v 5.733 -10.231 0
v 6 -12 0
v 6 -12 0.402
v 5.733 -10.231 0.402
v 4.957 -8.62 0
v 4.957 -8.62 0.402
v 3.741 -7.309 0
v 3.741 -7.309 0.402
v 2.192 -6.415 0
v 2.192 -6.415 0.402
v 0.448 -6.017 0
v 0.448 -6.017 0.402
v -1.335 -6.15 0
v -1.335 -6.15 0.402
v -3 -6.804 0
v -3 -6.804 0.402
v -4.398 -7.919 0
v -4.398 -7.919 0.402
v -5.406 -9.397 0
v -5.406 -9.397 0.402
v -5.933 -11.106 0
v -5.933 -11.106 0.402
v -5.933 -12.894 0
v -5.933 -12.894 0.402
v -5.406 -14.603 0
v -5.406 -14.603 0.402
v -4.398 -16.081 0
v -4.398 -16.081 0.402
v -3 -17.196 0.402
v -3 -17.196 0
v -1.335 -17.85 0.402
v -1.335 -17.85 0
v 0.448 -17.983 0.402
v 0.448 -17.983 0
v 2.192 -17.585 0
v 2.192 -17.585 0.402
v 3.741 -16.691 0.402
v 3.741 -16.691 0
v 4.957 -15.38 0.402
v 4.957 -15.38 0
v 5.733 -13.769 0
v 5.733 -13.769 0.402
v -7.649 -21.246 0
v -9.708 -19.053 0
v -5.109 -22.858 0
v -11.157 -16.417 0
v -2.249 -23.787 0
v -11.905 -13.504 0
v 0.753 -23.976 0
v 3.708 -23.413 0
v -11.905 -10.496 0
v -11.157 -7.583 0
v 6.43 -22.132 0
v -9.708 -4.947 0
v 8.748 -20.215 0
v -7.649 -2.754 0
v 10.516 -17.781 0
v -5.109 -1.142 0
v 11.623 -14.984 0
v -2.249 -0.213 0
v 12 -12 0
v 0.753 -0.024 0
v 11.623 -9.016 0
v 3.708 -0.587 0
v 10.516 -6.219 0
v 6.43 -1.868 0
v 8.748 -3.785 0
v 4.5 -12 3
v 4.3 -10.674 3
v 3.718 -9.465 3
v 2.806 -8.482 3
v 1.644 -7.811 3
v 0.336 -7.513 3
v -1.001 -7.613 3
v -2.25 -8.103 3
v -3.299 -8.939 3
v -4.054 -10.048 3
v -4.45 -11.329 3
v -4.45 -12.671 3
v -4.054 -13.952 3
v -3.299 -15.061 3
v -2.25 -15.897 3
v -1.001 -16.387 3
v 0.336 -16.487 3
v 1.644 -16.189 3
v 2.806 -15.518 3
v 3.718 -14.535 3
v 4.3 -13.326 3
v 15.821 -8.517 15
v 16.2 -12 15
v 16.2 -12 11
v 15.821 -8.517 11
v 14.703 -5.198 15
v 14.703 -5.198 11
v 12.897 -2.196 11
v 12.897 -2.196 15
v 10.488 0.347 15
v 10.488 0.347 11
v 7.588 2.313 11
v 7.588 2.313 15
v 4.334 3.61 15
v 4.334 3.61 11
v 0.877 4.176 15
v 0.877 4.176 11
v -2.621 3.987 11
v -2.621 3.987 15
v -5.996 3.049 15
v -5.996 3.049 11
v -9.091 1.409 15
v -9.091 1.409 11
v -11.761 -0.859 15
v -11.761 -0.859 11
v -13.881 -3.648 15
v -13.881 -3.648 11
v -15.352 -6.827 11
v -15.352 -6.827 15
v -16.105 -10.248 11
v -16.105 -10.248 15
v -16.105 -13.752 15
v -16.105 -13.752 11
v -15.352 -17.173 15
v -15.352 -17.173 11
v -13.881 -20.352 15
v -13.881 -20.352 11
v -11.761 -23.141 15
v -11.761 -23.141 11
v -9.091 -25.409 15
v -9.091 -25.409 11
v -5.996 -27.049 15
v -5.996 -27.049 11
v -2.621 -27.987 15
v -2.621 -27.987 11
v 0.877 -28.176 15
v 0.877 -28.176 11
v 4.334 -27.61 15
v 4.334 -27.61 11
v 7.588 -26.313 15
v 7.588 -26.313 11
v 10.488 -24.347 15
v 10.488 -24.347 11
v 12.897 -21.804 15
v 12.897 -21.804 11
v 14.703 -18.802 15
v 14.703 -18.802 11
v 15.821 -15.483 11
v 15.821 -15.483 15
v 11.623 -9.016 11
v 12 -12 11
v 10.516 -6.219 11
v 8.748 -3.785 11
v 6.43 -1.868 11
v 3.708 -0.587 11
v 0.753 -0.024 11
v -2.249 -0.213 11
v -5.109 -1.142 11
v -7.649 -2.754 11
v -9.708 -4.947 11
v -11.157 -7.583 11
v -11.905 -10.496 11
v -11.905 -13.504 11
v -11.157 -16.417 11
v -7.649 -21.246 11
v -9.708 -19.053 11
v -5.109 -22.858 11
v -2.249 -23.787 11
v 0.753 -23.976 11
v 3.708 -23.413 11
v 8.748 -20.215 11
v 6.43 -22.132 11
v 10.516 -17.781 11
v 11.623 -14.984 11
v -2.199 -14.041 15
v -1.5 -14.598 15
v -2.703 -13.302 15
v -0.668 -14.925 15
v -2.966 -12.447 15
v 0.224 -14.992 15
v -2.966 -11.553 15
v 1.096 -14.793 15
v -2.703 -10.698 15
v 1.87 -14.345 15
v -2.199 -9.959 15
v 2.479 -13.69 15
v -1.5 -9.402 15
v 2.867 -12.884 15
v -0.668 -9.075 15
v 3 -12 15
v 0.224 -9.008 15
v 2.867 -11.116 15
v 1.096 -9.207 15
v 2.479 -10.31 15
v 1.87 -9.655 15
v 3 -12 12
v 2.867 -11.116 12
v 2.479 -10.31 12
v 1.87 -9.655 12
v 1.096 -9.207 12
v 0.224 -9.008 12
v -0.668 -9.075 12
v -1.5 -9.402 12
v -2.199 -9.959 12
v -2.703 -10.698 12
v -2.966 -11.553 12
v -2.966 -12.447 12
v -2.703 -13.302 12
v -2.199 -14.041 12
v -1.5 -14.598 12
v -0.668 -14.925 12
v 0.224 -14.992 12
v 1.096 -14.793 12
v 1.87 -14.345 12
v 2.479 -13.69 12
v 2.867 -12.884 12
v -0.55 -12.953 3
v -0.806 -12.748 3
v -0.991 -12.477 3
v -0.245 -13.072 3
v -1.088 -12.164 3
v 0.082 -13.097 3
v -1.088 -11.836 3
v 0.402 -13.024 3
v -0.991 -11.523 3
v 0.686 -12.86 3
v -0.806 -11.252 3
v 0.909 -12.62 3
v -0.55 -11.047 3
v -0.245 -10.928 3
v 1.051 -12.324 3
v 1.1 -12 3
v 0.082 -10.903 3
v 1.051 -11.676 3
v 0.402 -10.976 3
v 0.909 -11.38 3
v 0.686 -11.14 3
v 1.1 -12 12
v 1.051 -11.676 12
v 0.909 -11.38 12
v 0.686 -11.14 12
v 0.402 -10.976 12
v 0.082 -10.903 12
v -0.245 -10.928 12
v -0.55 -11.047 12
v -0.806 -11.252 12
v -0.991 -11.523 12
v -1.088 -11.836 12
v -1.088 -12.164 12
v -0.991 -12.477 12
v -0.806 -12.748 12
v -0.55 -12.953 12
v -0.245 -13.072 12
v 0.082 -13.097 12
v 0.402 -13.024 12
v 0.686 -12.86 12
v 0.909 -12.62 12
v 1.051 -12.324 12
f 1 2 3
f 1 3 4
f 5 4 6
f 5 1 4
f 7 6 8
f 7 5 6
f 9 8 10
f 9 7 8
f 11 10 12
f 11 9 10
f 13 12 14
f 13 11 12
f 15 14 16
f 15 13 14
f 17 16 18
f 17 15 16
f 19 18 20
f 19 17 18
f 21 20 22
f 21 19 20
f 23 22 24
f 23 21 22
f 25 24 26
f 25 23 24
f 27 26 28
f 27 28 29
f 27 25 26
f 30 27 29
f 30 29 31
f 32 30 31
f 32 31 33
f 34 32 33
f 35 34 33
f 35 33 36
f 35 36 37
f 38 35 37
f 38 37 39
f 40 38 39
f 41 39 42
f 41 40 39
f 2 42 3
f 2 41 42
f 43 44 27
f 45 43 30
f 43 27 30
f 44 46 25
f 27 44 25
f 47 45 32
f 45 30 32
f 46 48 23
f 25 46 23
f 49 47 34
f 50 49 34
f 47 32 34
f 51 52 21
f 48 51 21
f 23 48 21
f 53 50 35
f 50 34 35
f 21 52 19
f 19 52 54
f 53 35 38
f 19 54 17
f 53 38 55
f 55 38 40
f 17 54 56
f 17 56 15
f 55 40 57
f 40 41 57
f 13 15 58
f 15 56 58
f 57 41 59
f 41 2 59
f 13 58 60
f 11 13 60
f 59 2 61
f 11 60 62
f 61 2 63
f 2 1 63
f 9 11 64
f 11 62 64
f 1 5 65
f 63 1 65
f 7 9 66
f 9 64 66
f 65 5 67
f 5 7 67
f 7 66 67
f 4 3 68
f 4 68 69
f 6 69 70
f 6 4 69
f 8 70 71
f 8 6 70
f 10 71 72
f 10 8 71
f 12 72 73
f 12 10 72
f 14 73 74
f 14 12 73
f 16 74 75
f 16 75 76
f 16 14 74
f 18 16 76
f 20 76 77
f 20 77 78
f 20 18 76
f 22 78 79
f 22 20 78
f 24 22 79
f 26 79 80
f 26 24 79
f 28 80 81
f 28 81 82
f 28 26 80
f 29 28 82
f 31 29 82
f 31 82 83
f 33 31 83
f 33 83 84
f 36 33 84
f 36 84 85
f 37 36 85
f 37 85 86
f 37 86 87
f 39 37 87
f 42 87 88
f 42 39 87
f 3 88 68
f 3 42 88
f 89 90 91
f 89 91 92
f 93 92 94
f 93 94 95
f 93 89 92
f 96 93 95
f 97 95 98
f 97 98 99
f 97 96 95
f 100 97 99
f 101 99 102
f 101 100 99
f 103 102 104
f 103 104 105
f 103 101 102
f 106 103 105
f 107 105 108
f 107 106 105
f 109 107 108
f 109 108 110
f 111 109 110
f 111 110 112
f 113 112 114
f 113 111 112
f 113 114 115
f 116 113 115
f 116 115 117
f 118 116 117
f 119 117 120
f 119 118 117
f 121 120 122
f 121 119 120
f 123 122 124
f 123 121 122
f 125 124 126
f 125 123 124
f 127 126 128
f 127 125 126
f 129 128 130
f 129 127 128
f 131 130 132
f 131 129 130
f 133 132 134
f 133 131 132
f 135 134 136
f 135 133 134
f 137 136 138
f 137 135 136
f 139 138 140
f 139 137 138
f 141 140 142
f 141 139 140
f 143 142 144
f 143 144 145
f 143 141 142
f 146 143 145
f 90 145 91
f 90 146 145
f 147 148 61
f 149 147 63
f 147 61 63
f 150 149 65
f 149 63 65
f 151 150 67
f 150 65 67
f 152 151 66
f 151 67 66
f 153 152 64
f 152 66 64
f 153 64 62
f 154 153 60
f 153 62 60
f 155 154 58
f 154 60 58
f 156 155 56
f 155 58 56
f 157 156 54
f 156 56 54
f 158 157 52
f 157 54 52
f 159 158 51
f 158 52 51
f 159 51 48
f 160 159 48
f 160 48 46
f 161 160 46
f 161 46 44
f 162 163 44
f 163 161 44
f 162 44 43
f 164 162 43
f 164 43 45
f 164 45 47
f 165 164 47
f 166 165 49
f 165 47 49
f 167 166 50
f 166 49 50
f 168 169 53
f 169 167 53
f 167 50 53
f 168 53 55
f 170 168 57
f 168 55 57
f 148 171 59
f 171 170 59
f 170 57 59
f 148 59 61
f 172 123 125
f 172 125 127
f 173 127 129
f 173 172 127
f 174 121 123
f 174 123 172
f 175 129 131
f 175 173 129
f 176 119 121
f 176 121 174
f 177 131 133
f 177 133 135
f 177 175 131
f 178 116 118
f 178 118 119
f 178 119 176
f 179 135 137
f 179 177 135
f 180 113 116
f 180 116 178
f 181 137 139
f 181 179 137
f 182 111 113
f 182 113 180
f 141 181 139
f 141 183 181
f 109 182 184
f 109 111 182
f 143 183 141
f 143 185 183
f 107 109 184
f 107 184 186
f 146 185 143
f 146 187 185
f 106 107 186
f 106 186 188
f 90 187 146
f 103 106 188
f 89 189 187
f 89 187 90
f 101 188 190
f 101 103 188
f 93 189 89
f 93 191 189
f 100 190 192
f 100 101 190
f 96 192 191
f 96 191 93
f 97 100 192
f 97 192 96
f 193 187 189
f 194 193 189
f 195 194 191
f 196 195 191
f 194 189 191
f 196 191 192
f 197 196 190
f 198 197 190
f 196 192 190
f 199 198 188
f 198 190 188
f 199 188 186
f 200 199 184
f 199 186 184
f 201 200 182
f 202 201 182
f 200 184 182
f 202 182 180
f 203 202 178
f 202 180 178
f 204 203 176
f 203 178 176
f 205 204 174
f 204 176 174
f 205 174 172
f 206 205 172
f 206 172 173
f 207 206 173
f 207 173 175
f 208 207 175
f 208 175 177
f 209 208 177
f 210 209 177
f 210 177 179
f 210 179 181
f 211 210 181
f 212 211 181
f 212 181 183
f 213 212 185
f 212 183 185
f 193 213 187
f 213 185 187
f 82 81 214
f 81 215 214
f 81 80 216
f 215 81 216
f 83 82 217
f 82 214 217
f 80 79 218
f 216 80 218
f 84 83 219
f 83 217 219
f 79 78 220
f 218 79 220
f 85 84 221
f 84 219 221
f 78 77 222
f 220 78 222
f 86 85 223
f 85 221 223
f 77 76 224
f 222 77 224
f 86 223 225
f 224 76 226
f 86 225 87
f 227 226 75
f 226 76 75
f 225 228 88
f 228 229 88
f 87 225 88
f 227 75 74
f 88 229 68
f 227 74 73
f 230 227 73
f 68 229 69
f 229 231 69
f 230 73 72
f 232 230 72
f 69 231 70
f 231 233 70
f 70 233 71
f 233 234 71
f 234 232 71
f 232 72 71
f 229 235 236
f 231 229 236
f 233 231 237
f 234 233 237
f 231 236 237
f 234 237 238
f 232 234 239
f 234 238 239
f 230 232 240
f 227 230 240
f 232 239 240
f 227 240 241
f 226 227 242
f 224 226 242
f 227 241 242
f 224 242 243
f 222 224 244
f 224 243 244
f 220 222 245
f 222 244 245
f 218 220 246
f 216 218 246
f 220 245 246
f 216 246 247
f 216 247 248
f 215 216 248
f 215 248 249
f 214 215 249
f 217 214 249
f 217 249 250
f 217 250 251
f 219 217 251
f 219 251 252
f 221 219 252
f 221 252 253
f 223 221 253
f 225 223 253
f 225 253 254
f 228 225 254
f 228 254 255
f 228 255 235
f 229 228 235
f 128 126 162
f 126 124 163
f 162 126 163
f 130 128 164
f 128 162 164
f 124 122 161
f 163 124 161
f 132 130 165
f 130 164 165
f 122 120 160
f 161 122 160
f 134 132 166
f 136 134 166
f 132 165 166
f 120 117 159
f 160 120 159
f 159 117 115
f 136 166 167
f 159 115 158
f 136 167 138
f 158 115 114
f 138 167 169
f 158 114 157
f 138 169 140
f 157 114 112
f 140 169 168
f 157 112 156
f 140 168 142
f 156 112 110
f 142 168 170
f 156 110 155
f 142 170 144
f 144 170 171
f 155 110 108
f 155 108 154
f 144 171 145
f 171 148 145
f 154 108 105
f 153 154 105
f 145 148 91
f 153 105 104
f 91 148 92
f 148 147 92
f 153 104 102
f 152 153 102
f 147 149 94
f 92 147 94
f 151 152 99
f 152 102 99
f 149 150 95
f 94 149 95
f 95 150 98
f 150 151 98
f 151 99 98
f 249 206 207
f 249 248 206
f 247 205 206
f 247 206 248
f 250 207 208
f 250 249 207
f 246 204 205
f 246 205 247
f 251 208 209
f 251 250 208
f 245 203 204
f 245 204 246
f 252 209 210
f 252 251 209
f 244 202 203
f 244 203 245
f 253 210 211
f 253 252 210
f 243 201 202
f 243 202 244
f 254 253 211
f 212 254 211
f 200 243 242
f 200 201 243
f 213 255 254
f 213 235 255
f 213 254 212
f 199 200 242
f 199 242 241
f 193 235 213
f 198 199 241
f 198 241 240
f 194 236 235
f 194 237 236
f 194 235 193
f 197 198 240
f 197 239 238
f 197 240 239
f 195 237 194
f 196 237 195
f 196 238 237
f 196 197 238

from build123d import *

# Parameters (mm, degrees)
SKIZZE1_R                       = 12
AUFSATZ_LINEAR_AUSTRAGEN1_DEPTH = 15
SKIZZE2_R                       = 16.2
AUFSATZ_LINEAR_AUSTRAGEN3_DEPTH = 4
SKIZZE3_R                       = 6
SCHNITT_LINEAR_AUSTRAGEN1_DEPTH = 3
FASE1_SIZE                      = 1.5
FASE1_SIZE2                     = 2.598076211
SKIZZE4_R                       = 1.1
SCHNITT_LINEAR_AUSTRAGEN2_DEPTH = 16
SKIZZE5_R                       = 3
SCHNITT_LINEAR_AUSTRAGEN3_DEPTH = 3


with BuildPart() as part:
    # Skizze1 → Aufsatz-Linear austragen1 (new body)
    with BuildSketch(Plane.XY):
        with Locations((0, -12)):
            Circle(SKIZZE1_R)
    extrude(amount=AUFSATZ_LINEAR_AUSTRAGEN1_DEPTH)

    # Skizze2 → Aufsatz-Linear austragen3 (add)
    with BuildSketch(Plane.XY.offset(15)):
        with Locations((0, -12)):
            Circle(SKIZZE2_R)
    extrude(amount=-AUFSATZ_LINEAR_AUSTRAGEN3_DEPTH)

    # Skizze3 → Schnitt-Linear austragen1 (cut)
    with BuildSketch(Plane.XY):
        with Locations((0, -12)):
            Circle(SKIZZE3_R)
    extrude(amount=SCHNITT_LINEAR_AUSTRAGEN1_DEPTH, mode=Mode.SUBTRACT)

    # Fase1
    fase1_edges = [part.edges().sort_by_distance(p)[0] for p in [
        (-6, -12, 3),
    ]]
    fase1_side = [part.faces().sort_by_distance(p)[0] for p in [
        (0, -12, 3),
    ]]
    chamfer(fase1_edges, length=FASE1_SIZE, length2=FASE1_SIZE2, reference=fase1_side[0])

    # Skizze4 → Schnitt-Linear austragen2 (cut, through all)
    with BuildSketch(Plane.XY.offset(15)):
        with Locations((0, -12)):
            Circle(SKIZZE4_R)
    extrude(amount=-SCHNITT_LINEAR_AUSTRAGEN2_DEPTH, mode=Mode.SUBTRACT)

    # Skizze5 → Schnitt-Linear austragen3 (cut)
    with BuildSketch(Plane.XY.offset(15)):
        with Locations((0, -12)):
            Circle(SKIZZE5_R)
    extrude(amount=-SCHNITT_LINEAR_AUSTRAGEN3_DEPTH, mode=Mode.SUBTRACT)


solid = part.part
